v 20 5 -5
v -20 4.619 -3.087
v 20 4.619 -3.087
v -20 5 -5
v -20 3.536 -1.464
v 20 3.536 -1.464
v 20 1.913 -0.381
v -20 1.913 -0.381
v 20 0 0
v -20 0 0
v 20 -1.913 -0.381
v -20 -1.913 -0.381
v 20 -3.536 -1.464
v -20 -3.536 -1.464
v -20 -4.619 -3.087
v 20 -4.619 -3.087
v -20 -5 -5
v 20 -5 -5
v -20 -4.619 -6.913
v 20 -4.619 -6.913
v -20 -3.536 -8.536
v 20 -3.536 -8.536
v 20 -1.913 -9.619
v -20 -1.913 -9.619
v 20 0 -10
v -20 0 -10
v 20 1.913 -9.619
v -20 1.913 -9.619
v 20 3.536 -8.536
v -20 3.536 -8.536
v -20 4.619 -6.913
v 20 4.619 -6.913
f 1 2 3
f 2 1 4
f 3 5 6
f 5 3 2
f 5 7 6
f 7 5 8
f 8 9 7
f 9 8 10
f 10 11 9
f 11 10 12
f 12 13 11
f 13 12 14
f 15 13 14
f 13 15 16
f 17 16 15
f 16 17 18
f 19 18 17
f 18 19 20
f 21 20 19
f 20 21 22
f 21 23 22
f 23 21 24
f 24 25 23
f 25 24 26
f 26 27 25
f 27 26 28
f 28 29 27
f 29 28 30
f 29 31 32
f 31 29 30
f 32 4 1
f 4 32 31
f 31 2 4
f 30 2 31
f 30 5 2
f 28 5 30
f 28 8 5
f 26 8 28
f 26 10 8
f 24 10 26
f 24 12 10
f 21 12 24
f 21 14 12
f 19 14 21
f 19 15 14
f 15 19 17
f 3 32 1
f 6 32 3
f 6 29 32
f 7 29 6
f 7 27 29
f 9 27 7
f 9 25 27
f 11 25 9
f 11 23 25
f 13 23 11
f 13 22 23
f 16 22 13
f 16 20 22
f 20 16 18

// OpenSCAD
// Length of tool pommel
length_pommel = 15;

// Width of marlinespike side where shaft meets pommel
base_width_marlinespike = 20;

// Diameter of lanyard hole
diameter_lanyard = 10;

// Distance from edge of lanyard hole to tip of pommel
offset_lanyard = 5;

module lanyard(length_pommel, diameter_lanyard, offset_lanyard, base_width_marlinespike) {
  rotate([0, 0, 90]) translate([0, 0, -length_pommel + diameter_lanyard/2 + offset_lanyard]) rotate([90, 0, 0]) cylinder(d=diameter_lanyard, h=base_width_marlinespike*2, center=true);
}

lanyard(length_pommel, diameter_lanyard, offset_lanyard, base_width_marlinespike);
